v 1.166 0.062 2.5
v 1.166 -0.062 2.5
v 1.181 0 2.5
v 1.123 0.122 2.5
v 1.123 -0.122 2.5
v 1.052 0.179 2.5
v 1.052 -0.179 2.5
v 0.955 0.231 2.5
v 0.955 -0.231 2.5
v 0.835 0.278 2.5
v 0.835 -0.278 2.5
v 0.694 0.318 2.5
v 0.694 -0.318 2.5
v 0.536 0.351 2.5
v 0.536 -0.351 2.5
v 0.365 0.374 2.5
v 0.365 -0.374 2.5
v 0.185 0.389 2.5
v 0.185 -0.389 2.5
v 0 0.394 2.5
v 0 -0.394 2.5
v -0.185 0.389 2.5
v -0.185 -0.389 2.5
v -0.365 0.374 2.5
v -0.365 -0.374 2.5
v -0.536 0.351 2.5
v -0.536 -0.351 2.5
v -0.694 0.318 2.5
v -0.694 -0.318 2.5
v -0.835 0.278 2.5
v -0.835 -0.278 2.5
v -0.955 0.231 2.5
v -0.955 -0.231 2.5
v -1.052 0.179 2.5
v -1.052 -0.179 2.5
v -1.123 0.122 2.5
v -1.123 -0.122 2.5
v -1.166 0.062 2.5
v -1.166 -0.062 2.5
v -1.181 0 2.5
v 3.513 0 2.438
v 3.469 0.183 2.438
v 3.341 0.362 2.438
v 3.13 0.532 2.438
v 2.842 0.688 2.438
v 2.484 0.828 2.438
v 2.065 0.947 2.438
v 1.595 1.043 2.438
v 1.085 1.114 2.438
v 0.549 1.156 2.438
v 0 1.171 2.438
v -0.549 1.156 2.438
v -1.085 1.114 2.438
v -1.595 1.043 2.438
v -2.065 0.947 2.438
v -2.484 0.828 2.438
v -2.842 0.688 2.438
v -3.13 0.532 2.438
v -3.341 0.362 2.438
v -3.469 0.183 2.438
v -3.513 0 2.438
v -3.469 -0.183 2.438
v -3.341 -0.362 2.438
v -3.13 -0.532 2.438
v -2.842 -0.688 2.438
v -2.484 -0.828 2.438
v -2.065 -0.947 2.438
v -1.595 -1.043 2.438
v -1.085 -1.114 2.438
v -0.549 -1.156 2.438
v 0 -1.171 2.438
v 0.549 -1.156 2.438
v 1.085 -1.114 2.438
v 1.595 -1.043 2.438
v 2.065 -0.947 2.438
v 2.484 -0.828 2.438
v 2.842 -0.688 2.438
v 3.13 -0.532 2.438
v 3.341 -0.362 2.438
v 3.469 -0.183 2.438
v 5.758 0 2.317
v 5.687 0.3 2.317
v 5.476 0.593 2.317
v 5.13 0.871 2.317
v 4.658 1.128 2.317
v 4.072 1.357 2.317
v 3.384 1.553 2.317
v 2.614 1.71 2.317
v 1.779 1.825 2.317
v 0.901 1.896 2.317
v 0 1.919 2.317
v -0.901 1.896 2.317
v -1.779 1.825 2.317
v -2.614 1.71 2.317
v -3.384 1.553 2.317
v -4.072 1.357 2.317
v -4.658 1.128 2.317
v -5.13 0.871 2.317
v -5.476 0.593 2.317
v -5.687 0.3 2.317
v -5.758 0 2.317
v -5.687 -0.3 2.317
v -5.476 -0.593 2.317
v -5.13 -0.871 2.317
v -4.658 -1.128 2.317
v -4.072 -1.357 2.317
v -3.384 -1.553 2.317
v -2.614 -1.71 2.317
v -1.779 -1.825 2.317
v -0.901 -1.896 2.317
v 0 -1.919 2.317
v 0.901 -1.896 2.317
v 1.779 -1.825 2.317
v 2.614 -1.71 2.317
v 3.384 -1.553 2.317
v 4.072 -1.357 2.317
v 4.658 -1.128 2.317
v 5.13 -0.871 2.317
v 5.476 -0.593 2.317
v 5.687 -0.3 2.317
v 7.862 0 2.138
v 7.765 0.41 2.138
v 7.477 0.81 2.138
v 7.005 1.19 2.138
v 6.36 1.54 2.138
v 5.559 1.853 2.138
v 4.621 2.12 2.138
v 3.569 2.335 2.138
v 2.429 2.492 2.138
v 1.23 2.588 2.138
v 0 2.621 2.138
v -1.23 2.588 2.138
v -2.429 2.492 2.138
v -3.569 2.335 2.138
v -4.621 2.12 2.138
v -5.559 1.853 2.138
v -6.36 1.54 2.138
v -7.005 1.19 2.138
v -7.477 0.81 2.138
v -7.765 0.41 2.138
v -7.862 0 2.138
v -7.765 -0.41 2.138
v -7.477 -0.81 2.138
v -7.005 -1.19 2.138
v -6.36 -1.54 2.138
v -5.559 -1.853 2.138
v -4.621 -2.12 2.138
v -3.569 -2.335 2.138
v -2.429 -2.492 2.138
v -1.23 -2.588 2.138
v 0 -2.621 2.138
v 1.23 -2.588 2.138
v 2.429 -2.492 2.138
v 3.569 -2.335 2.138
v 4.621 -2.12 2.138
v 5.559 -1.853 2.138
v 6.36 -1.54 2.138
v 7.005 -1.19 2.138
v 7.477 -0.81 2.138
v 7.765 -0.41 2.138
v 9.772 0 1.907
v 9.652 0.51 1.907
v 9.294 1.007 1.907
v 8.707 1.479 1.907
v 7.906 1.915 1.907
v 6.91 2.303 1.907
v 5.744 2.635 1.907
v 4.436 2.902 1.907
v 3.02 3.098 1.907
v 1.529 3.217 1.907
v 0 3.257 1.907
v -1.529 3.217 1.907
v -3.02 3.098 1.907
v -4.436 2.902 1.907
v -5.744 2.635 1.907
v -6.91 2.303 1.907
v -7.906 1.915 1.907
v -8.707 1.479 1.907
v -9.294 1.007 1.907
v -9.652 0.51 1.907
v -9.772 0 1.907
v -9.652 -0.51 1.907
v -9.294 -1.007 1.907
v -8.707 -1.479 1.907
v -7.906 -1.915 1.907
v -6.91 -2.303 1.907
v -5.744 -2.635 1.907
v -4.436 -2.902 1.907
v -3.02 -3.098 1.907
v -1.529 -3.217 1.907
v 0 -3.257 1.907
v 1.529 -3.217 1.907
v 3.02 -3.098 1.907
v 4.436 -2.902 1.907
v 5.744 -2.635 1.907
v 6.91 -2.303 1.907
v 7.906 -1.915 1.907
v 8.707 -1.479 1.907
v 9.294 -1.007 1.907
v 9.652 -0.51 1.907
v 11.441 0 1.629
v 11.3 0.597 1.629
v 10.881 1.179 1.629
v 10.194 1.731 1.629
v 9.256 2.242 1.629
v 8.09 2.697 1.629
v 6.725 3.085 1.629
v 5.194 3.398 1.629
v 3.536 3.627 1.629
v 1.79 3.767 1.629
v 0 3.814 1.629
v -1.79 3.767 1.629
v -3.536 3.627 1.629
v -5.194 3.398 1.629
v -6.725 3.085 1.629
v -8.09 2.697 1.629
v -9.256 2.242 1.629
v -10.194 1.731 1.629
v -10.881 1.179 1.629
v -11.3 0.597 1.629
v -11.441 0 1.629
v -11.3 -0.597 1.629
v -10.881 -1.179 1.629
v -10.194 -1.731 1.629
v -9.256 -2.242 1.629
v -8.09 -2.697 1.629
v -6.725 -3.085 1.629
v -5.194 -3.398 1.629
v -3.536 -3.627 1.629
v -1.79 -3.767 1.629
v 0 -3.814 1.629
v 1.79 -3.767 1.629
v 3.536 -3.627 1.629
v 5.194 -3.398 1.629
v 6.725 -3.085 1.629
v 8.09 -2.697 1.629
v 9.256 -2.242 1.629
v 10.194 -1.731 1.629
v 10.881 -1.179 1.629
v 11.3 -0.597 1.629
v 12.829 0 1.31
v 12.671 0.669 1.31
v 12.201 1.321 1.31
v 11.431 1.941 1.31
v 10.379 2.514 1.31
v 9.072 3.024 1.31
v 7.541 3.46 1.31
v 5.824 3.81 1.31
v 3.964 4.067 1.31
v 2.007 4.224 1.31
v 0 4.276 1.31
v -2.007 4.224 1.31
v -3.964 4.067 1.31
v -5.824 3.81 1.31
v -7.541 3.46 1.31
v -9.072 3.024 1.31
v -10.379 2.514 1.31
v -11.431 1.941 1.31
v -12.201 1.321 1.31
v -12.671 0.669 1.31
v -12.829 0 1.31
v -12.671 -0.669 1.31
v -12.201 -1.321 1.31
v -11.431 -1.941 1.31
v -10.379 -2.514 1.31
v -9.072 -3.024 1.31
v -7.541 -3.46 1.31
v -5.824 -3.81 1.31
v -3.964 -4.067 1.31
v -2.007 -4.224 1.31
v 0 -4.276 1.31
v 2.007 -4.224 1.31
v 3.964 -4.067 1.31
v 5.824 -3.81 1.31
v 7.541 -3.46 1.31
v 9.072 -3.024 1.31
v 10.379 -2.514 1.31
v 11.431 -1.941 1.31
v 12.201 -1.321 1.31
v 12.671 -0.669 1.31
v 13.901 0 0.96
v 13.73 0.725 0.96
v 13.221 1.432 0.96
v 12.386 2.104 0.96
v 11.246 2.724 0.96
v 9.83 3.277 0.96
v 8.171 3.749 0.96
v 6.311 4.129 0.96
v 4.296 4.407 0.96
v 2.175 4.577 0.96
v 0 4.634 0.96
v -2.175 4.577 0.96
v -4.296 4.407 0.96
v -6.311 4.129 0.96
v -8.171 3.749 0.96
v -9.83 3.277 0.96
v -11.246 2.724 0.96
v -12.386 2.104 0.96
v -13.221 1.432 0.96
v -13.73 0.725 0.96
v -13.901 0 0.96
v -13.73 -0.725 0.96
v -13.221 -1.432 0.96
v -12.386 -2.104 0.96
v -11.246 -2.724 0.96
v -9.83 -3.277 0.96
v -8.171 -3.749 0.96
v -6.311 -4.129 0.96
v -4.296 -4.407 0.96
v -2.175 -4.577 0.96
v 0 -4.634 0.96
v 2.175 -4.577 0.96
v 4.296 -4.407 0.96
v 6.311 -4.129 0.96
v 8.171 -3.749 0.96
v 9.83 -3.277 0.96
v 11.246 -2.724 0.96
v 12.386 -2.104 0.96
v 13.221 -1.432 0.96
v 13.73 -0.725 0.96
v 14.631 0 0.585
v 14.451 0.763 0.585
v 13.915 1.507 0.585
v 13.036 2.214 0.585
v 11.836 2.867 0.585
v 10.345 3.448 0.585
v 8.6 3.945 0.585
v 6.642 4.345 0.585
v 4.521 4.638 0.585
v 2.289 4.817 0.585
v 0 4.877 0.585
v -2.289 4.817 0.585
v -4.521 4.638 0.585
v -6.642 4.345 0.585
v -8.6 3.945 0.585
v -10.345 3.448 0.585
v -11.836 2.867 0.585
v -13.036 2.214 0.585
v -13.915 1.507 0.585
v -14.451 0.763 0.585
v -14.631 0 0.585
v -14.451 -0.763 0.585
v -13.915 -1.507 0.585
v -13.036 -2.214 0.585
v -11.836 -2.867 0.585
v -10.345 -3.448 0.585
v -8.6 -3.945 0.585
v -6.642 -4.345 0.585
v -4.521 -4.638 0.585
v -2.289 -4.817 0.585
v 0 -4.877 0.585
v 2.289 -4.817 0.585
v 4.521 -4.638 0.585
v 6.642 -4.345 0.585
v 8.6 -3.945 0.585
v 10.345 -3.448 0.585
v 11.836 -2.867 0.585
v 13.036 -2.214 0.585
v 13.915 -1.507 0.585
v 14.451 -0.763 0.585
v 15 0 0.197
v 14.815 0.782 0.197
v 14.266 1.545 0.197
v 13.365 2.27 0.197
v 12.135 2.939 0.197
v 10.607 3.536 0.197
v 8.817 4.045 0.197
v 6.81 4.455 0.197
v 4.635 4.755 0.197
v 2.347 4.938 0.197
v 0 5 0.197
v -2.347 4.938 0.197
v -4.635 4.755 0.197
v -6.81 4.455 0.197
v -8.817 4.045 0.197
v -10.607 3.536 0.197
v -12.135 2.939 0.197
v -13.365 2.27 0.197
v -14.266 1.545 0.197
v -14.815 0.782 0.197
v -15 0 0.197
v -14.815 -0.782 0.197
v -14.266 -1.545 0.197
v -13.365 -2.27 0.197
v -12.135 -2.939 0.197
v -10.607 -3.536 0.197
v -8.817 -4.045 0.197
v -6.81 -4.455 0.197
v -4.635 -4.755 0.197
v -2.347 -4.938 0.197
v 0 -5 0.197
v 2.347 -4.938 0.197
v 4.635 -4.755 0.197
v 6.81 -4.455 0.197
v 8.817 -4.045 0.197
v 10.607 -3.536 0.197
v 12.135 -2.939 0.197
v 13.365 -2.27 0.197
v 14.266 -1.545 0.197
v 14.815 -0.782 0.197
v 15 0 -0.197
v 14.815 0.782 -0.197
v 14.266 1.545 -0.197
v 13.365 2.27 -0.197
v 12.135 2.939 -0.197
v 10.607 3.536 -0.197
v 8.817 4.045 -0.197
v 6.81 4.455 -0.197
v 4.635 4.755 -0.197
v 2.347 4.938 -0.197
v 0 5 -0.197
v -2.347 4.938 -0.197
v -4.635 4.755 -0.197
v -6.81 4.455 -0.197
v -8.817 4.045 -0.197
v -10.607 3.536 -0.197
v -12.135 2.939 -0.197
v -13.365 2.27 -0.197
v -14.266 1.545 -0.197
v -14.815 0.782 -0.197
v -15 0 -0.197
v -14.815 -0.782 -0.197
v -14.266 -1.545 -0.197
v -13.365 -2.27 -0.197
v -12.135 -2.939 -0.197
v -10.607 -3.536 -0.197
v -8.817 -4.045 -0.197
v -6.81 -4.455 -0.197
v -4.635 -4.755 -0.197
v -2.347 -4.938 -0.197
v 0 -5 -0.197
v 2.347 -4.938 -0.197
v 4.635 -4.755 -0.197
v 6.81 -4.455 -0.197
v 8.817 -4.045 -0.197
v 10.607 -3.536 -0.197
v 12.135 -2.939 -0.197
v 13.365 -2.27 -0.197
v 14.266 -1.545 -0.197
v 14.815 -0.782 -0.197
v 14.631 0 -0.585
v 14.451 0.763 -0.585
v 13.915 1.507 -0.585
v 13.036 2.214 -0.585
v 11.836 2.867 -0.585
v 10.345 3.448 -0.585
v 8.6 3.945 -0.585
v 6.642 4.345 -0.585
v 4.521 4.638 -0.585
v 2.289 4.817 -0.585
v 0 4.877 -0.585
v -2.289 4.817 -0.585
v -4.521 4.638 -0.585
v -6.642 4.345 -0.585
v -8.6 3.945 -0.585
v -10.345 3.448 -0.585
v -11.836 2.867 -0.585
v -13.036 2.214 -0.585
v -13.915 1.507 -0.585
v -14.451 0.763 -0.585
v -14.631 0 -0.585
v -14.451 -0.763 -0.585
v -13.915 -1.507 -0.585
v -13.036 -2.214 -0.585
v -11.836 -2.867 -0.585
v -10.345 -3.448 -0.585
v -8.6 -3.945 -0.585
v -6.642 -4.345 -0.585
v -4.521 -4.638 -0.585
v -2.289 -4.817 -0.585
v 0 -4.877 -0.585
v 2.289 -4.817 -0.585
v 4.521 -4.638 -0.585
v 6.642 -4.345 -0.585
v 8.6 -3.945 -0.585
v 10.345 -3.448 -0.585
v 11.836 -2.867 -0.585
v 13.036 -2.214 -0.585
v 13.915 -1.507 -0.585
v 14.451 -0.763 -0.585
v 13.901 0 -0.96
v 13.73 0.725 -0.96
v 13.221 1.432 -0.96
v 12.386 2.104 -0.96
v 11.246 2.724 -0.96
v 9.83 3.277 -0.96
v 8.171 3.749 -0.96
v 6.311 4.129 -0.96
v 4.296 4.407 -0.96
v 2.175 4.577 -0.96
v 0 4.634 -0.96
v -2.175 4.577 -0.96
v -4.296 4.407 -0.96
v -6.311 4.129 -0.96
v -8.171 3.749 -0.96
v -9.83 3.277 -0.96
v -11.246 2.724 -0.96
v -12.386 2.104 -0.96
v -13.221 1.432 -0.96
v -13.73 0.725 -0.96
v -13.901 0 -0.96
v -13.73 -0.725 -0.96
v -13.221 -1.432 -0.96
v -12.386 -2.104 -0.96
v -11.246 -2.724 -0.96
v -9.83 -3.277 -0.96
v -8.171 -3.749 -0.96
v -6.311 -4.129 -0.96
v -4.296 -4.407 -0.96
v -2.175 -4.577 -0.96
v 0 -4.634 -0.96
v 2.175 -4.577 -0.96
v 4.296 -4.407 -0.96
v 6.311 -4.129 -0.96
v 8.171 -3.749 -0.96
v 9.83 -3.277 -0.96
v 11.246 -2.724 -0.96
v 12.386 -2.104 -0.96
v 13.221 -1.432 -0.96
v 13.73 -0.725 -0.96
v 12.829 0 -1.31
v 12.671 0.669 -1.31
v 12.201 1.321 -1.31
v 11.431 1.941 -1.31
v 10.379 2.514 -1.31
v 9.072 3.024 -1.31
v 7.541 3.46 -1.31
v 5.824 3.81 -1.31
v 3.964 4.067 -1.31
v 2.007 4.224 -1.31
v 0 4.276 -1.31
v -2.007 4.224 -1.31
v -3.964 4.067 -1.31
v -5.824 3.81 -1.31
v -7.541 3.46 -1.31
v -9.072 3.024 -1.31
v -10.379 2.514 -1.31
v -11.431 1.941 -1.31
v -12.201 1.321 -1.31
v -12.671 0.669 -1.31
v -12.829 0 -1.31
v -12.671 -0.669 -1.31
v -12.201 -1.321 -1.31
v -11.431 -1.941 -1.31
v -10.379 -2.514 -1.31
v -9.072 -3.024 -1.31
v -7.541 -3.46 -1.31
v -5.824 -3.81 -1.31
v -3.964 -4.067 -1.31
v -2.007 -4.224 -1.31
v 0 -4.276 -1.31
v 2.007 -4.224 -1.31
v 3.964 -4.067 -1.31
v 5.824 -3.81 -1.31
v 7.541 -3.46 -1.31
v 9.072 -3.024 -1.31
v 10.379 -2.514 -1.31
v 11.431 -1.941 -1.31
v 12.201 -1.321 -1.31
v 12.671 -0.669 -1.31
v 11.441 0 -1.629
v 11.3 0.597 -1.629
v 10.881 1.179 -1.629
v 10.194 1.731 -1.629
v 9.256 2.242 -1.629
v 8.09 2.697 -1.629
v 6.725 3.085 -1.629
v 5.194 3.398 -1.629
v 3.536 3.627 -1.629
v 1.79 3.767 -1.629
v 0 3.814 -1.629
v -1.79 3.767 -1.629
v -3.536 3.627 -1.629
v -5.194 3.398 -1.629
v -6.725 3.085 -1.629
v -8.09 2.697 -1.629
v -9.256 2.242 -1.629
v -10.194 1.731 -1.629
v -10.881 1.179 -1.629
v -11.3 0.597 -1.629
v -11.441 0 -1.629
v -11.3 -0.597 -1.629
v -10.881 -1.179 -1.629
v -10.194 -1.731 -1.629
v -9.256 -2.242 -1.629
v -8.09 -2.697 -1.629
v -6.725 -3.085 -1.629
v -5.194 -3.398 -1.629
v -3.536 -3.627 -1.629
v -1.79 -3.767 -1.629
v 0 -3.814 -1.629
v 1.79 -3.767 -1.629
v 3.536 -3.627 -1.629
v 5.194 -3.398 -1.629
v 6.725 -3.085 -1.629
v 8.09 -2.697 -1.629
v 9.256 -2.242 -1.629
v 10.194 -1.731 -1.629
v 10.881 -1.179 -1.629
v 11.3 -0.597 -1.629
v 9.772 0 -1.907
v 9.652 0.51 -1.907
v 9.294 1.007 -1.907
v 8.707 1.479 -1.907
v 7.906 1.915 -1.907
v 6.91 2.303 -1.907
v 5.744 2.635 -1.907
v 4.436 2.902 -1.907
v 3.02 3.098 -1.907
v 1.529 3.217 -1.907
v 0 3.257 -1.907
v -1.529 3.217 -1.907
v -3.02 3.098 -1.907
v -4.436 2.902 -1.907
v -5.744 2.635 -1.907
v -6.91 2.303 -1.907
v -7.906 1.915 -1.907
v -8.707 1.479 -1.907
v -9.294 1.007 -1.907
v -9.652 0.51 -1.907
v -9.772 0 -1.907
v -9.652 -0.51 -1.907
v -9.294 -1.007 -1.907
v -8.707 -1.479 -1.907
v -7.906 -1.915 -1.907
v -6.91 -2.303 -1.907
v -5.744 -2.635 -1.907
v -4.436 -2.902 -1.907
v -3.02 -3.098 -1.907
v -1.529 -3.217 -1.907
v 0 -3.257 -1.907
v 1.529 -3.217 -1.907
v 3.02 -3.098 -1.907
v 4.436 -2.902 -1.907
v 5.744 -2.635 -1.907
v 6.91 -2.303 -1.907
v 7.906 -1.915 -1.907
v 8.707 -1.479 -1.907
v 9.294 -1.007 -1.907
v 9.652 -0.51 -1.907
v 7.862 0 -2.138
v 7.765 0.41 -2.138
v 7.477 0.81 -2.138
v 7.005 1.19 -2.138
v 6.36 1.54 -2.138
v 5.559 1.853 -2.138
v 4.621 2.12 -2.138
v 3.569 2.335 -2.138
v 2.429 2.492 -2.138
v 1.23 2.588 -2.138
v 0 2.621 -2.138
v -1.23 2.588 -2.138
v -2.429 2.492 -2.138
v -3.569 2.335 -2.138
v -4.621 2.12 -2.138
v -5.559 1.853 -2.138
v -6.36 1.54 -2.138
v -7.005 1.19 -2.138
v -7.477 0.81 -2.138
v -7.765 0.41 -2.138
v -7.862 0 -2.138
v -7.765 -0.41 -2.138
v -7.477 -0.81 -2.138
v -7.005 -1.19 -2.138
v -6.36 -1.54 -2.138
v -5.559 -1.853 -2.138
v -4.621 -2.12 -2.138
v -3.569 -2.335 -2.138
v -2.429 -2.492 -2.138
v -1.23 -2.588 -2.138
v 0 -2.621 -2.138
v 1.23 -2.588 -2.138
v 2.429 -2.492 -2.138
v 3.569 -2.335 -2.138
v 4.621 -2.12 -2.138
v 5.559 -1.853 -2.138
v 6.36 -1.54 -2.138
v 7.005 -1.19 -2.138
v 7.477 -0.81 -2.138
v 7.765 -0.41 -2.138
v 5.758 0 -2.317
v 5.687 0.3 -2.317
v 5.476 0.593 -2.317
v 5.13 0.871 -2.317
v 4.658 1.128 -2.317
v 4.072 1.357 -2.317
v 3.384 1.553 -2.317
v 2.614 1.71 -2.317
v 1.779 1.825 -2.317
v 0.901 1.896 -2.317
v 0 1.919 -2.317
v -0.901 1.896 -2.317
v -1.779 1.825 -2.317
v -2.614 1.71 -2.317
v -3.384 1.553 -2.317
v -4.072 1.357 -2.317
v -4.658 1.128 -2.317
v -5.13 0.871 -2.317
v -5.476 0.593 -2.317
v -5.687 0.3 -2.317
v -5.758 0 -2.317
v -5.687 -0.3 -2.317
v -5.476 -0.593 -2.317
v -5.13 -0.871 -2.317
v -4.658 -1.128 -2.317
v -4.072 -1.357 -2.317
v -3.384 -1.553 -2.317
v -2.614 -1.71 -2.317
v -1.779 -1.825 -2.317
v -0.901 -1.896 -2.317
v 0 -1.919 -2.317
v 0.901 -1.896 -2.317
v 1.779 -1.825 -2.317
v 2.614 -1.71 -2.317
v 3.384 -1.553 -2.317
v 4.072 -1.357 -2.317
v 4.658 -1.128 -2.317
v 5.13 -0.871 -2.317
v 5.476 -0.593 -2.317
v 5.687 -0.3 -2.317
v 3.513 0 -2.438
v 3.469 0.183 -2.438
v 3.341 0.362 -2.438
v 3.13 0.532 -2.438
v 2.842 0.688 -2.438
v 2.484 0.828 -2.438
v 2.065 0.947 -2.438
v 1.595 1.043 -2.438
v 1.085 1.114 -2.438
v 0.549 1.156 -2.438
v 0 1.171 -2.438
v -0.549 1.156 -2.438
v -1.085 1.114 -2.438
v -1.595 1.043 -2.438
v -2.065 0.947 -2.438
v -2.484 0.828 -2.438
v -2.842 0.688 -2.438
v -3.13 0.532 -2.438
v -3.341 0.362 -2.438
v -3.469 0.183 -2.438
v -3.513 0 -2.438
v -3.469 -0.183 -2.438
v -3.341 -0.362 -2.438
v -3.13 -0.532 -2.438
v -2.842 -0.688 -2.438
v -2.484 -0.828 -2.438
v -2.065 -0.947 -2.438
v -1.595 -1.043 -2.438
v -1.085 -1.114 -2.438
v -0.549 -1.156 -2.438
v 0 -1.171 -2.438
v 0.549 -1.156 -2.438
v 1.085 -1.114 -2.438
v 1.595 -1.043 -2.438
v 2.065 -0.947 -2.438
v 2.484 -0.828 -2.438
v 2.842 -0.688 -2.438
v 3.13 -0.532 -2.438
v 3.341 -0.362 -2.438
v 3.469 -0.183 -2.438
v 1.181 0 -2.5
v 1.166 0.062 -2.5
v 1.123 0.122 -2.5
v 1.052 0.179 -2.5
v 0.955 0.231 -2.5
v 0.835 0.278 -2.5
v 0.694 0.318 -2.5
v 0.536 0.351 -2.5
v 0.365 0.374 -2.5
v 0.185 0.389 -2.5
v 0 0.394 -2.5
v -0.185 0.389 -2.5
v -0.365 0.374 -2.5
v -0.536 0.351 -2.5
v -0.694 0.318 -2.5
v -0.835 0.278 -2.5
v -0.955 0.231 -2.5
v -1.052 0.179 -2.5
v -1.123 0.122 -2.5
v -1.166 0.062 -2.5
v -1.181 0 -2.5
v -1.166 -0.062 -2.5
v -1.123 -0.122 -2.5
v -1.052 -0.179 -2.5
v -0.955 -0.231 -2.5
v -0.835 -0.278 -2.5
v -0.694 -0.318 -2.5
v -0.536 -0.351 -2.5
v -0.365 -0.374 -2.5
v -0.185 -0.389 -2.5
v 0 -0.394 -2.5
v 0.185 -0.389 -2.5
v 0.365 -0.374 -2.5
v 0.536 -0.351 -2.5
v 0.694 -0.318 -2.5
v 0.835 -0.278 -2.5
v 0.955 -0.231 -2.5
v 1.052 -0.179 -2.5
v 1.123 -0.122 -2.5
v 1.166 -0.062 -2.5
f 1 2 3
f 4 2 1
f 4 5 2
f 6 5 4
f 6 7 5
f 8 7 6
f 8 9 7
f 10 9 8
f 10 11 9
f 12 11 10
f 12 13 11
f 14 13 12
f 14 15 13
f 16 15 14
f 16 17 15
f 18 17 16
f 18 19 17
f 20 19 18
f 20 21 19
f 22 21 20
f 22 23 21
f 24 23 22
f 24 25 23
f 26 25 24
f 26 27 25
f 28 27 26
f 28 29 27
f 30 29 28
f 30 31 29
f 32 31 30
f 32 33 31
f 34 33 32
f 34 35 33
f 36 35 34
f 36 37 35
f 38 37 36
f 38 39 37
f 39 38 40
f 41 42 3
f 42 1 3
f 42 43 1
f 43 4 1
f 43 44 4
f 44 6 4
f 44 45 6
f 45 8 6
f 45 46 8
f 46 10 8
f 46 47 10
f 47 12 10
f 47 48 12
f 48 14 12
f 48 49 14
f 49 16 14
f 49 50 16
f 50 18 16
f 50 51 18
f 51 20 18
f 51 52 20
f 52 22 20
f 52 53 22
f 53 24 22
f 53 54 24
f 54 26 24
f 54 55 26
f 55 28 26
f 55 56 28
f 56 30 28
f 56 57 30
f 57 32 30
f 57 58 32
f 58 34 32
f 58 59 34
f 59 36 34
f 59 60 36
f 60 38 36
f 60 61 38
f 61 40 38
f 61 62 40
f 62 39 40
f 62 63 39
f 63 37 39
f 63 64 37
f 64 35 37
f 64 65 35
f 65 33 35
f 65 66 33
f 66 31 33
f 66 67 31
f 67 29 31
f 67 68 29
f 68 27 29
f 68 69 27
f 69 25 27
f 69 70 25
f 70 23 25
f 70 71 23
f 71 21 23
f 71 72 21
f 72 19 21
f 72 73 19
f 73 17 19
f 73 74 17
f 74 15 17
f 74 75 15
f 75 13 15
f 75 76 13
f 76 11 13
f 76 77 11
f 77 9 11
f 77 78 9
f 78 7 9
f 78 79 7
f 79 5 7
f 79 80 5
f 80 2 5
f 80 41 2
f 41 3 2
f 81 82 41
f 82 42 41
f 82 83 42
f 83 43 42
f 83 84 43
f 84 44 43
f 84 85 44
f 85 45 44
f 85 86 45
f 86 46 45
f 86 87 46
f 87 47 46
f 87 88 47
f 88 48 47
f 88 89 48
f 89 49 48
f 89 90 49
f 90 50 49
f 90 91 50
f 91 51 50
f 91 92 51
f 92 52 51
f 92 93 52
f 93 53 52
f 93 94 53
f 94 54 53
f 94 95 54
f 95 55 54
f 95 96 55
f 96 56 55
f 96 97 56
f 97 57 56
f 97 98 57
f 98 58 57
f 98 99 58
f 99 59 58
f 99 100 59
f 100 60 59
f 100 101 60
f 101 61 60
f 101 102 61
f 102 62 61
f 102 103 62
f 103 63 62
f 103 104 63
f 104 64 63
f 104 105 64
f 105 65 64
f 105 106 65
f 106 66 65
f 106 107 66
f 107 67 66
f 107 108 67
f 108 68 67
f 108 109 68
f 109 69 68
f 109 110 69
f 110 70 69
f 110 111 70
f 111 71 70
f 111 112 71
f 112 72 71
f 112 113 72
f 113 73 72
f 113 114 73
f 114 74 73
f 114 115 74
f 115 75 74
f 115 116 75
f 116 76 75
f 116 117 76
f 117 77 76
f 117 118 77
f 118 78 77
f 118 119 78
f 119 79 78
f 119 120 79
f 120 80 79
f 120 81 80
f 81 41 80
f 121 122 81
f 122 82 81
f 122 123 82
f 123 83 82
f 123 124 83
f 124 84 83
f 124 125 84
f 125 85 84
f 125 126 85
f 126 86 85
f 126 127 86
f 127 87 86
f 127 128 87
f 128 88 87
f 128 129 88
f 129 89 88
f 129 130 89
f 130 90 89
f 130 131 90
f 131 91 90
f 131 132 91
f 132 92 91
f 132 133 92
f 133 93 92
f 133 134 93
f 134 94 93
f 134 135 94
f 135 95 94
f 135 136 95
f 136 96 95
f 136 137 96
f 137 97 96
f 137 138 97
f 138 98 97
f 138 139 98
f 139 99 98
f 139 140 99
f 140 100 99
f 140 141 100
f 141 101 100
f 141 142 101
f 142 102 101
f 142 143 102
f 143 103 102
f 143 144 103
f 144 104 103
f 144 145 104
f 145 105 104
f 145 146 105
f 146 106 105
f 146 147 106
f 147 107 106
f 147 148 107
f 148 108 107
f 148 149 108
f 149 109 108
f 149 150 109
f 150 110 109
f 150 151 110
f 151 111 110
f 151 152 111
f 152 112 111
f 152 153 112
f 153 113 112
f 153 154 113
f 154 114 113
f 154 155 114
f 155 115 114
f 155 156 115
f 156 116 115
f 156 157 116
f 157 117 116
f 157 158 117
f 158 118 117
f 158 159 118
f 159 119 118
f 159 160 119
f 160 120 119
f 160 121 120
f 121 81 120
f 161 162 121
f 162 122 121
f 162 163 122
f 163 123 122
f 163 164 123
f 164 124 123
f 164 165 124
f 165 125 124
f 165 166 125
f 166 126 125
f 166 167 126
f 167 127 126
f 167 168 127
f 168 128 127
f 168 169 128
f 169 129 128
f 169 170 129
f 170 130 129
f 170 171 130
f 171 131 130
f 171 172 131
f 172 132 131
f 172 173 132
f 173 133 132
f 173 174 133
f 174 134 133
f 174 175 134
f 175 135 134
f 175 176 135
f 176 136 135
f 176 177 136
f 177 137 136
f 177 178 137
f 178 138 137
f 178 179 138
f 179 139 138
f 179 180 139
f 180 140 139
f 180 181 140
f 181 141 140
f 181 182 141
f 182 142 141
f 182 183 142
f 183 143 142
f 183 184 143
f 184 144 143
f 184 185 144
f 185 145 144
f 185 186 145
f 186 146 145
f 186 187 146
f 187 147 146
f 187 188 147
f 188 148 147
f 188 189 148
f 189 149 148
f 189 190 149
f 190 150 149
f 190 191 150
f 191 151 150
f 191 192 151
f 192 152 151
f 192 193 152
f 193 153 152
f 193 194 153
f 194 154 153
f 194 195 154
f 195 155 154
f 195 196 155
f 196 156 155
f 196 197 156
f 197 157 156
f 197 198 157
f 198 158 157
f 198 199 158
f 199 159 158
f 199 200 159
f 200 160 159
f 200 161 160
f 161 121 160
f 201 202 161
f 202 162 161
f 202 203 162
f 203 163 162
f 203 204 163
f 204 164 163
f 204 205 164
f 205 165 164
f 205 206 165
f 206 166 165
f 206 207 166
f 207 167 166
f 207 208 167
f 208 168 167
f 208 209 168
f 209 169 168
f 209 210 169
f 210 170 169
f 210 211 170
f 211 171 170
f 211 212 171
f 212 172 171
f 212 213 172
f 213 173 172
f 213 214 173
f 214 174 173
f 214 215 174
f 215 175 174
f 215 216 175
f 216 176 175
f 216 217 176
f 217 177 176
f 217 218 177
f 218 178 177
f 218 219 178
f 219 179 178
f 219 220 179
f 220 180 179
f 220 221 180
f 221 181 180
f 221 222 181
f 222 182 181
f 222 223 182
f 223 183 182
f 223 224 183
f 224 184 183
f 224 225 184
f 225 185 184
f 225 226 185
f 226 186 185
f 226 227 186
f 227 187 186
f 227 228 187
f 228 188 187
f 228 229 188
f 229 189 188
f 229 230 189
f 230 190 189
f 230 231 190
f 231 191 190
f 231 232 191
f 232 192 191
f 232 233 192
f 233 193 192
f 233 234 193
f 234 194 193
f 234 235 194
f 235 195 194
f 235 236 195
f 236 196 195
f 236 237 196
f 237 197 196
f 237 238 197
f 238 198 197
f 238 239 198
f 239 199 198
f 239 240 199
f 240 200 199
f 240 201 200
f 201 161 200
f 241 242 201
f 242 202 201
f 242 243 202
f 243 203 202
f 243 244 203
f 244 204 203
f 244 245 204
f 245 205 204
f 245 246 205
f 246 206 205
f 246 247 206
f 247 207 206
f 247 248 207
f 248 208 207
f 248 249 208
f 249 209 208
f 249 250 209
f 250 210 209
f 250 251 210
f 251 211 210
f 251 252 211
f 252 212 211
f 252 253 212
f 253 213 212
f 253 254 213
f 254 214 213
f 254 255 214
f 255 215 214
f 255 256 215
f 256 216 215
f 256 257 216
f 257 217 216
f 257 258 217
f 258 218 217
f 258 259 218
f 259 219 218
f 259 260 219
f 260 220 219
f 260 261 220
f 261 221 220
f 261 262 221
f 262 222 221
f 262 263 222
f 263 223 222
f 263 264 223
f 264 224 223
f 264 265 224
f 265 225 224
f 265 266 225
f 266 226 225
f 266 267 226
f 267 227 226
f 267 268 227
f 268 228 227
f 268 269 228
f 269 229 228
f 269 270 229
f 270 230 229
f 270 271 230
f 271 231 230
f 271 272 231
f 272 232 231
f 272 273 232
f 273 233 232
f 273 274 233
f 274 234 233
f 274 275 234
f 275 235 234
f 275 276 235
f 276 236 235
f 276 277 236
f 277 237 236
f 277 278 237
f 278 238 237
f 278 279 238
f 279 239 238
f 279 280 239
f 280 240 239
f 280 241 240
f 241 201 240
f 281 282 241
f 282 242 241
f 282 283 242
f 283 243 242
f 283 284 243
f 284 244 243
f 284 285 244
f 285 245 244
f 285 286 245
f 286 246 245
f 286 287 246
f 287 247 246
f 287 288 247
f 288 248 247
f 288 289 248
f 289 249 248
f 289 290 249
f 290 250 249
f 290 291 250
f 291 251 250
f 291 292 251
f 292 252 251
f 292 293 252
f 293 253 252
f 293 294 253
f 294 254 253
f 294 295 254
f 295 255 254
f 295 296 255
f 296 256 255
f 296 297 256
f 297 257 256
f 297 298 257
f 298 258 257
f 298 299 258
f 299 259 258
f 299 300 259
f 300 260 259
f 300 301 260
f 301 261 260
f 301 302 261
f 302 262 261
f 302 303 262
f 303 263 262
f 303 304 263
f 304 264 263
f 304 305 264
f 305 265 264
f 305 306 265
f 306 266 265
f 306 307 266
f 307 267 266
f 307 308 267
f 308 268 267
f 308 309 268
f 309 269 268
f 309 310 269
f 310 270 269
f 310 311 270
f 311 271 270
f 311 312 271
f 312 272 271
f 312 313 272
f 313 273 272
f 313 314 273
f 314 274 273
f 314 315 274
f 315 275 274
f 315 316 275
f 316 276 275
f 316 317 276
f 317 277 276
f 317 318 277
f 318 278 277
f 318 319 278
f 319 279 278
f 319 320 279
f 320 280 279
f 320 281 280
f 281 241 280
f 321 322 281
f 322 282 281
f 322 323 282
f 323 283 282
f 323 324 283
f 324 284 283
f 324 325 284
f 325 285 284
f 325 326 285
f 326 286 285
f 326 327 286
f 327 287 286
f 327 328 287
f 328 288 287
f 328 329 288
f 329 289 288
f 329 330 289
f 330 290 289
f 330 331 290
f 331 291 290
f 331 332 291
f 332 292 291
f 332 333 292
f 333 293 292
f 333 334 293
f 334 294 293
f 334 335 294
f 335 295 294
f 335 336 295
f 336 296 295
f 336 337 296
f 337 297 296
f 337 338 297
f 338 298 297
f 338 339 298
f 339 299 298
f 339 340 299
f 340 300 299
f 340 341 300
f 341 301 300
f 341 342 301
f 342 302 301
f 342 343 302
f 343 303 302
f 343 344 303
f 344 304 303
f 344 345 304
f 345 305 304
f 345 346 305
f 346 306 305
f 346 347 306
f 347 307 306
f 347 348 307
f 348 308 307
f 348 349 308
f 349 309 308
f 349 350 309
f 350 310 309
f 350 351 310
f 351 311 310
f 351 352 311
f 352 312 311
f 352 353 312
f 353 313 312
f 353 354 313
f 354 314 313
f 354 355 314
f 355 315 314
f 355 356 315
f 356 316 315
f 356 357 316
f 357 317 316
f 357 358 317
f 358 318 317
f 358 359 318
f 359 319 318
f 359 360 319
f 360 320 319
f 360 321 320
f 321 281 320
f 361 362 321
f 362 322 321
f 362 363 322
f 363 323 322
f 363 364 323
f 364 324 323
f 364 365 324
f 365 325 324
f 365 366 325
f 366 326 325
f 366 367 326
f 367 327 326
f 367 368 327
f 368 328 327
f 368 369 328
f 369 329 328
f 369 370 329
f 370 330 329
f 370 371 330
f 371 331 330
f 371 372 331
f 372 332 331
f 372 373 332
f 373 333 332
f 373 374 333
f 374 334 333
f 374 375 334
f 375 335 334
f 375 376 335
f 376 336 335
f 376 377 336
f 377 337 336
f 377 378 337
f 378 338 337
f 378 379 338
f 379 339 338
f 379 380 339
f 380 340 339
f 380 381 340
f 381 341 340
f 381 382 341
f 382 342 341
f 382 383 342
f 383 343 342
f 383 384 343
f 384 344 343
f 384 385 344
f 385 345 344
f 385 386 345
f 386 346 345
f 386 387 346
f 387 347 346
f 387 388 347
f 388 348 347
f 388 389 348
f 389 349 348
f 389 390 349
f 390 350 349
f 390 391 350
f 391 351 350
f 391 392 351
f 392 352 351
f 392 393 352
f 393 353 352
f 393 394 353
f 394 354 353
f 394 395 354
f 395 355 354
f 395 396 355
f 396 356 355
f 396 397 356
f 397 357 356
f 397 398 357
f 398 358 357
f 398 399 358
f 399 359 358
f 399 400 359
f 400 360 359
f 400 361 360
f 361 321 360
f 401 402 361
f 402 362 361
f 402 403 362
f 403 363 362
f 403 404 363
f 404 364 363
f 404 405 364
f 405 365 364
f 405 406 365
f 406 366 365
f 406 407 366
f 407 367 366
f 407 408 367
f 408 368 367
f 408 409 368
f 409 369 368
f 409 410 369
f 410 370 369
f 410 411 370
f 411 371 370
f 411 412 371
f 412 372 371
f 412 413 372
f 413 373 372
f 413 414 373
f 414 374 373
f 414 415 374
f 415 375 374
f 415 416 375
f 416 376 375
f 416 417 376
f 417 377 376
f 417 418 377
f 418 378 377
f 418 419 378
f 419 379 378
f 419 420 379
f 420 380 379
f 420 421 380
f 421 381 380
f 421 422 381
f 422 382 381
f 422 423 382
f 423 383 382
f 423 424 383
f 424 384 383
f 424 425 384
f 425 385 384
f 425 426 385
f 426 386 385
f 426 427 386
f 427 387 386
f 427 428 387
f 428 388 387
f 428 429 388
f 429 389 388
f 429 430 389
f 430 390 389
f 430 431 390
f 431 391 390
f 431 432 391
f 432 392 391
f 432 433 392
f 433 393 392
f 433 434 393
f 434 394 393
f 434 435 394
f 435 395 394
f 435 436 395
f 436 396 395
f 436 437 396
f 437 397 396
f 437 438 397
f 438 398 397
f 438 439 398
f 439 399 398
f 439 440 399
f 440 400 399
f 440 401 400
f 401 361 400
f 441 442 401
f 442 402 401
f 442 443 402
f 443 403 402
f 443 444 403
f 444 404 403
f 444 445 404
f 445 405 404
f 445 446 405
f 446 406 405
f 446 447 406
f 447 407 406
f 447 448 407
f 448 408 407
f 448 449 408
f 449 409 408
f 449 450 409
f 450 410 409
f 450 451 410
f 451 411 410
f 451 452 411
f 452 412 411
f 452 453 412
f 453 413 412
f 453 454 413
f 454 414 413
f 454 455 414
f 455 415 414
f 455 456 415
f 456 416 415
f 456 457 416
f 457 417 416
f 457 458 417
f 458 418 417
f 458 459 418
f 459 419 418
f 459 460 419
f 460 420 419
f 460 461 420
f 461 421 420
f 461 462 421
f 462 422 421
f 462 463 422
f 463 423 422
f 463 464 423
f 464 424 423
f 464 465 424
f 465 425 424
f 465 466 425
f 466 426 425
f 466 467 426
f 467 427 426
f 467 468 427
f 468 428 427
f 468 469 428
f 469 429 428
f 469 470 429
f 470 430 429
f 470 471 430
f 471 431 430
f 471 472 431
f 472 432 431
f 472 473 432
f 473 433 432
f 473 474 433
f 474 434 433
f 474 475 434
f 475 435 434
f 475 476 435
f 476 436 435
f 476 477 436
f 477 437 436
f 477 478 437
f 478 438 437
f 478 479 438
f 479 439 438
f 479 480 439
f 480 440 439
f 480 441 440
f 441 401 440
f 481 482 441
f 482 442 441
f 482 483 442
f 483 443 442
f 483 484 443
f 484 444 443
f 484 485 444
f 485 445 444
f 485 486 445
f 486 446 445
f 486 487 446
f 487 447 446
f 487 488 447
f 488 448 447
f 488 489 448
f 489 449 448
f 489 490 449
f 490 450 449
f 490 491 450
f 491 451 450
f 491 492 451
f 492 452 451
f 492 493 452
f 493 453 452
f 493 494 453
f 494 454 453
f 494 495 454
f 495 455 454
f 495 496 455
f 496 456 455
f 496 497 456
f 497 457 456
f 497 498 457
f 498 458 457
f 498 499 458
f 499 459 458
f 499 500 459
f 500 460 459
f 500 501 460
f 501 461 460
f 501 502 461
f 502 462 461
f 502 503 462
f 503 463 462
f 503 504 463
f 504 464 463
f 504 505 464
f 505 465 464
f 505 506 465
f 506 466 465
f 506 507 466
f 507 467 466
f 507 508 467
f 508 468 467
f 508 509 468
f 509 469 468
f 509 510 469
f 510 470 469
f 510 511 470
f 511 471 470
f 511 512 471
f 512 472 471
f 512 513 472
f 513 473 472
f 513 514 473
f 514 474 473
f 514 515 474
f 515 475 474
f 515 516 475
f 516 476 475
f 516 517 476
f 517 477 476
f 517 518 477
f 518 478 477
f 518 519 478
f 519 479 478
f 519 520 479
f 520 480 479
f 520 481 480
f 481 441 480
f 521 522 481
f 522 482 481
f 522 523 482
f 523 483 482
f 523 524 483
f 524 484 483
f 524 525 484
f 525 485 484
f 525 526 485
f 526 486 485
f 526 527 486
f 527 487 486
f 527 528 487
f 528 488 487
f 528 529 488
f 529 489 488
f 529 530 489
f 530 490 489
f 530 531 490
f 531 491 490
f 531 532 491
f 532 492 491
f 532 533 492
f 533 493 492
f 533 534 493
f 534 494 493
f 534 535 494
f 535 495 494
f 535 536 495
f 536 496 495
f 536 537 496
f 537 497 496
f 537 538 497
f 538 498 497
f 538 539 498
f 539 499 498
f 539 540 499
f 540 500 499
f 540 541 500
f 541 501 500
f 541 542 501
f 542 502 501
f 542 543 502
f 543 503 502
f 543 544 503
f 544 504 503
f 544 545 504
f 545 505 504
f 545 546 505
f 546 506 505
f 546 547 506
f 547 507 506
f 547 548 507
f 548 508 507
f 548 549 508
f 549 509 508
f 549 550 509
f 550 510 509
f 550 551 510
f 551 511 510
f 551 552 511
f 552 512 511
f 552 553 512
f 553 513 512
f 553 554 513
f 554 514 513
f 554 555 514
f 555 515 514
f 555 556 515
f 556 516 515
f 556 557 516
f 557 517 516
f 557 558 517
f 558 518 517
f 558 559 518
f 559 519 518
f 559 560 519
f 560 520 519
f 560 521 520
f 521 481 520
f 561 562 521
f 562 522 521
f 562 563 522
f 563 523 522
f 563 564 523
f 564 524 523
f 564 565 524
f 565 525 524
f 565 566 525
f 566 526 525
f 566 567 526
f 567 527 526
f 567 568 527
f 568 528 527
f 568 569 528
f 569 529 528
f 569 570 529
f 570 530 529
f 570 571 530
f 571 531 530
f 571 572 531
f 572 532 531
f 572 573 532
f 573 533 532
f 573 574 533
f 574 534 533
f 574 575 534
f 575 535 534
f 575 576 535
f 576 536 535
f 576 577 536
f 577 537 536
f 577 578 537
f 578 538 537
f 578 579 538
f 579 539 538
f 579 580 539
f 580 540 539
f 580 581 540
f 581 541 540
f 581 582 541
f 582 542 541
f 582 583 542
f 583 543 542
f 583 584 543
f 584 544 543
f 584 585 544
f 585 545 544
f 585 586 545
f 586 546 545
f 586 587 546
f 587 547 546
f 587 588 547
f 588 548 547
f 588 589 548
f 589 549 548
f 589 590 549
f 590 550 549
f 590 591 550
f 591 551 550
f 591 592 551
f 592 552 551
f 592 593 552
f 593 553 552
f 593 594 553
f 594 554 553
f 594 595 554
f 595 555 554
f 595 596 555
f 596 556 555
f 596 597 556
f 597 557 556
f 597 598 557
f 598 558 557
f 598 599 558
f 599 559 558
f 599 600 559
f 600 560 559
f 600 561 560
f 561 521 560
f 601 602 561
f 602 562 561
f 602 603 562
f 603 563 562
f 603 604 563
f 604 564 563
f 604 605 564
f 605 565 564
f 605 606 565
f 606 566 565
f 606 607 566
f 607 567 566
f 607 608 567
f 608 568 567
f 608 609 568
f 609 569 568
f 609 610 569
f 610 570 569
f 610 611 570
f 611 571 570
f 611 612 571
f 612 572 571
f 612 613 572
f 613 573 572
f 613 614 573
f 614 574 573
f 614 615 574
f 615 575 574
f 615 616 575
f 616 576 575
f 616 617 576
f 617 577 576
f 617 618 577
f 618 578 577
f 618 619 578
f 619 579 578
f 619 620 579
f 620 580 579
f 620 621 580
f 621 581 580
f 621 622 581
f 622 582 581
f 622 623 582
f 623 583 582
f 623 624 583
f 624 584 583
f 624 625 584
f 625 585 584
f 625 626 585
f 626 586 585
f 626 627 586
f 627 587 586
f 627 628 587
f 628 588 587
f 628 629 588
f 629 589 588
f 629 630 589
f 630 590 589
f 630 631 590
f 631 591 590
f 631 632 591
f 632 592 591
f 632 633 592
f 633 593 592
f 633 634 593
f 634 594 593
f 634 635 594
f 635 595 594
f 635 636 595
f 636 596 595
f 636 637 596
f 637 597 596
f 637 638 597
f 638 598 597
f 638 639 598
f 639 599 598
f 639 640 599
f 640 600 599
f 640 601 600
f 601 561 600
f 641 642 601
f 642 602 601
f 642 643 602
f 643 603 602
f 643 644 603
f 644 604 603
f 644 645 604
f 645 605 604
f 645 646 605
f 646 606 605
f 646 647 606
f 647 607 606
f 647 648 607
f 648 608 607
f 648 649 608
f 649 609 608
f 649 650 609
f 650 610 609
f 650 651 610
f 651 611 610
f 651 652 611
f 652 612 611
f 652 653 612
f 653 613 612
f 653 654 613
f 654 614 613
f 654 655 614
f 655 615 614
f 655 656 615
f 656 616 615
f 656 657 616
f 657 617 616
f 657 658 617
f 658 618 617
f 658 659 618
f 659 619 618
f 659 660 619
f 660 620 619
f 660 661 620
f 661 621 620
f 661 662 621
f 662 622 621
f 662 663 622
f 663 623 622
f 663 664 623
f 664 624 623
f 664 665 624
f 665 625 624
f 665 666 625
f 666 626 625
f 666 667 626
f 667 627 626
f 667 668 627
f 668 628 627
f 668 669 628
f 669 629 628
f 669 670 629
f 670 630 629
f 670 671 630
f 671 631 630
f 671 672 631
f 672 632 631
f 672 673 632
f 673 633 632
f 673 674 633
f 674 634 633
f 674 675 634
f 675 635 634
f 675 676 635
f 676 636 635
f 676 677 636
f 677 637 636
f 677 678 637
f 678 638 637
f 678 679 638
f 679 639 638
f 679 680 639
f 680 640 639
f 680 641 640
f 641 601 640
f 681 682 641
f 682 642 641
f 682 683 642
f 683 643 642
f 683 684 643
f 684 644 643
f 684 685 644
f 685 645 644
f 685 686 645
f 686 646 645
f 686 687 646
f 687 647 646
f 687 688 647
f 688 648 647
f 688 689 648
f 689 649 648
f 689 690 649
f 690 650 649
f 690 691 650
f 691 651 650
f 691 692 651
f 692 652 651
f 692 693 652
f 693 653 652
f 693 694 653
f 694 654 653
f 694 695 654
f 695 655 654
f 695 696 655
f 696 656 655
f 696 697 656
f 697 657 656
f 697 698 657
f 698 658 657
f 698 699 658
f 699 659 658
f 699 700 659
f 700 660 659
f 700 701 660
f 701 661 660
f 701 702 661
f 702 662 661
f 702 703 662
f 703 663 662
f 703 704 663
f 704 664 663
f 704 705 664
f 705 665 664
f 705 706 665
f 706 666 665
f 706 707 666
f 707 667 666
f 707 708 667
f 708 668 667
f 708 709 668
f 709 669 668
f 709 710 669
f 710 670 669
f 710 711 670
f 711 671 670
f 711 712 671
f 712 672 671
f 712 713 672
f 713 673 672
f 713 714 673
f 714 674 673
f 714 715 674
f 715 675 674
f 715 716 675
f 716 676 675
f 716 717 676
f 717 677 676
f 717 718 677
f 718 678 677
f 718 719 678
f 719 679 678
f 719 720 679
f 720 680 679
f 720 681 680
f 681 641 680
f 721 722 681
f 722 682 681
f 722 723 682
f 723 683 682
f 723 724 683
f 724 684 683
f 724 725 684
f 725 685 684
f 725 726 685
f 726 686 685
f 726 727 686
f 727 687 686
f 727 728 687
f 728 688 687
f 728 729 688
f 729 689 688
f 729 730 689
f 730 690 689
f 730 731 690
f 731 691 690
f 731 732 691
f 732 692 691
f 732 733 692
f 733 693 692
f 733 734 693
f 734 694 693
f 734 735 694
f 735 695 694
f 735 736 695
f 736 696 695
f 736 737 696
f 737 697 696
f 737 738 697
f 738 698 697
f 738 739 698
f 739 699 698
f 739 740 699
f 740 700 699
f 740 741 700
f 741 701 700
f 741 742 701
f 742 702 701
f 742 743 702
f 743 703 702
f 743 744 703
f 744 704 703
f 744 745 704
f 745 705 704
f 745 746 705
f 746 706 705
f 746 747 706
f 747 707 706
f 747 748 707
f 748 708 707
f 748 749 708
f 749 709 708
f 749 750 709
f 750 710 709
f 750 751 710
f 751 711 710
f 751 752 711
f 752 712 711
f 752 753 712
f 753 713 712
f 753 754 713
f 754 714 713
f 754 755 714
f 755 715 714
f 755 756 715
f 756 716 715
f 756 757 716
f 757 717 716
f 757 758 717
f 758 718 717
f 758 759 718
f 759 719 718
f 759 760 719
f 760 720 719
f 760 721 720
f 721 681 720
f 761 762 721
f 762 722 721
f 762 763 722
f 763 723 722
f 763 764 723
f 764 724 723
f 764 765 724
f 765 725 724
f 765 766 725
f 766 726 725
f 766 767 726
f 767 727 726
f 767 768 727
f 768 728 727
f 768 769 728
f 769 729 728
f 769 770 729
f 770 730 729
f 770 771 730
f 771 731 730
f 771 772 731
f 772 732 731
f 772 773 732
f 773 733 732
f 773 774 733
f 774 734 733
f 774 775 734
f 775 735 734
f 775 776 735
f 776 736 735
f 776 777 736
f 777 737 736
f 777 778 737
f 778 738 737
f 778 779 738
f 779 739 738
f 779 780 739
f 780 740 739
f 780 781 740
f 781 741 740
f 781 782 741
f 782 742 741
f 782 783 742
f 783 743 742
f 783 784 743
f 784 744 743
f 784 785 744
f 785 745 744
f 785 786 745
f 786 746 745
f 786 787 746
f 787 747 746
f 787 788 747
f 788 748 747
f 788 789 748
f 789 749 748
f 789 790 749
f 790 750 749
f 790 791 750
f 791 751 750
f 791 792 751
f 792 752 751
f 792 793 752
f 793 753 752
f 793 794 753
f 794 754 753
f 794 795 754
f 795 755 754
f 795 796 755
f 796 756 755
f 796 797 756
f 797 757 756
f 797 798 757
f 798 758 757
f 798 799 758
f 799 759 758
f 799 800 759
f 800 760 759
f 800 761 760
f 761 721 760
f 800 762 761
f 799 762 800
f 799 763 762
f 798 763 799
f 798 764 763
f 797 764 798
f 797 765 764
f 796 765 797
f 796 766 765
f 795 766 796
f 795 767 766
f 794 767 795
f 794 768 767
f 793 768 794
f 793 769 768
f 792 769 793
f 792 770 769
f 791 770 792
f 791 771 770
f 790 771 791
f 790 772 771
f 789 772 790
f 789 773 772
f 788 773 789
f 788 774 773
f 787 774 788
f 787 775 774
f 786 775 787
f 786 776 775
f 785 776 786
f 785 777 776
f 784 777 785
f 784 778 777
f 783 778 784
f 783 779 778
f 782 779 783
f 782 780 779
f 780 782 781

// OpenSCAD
// Construct: resize() forcing a solid to a target bounding box.
resize([30, 10, 5]) sphere(r = 8, $fn = 40);
